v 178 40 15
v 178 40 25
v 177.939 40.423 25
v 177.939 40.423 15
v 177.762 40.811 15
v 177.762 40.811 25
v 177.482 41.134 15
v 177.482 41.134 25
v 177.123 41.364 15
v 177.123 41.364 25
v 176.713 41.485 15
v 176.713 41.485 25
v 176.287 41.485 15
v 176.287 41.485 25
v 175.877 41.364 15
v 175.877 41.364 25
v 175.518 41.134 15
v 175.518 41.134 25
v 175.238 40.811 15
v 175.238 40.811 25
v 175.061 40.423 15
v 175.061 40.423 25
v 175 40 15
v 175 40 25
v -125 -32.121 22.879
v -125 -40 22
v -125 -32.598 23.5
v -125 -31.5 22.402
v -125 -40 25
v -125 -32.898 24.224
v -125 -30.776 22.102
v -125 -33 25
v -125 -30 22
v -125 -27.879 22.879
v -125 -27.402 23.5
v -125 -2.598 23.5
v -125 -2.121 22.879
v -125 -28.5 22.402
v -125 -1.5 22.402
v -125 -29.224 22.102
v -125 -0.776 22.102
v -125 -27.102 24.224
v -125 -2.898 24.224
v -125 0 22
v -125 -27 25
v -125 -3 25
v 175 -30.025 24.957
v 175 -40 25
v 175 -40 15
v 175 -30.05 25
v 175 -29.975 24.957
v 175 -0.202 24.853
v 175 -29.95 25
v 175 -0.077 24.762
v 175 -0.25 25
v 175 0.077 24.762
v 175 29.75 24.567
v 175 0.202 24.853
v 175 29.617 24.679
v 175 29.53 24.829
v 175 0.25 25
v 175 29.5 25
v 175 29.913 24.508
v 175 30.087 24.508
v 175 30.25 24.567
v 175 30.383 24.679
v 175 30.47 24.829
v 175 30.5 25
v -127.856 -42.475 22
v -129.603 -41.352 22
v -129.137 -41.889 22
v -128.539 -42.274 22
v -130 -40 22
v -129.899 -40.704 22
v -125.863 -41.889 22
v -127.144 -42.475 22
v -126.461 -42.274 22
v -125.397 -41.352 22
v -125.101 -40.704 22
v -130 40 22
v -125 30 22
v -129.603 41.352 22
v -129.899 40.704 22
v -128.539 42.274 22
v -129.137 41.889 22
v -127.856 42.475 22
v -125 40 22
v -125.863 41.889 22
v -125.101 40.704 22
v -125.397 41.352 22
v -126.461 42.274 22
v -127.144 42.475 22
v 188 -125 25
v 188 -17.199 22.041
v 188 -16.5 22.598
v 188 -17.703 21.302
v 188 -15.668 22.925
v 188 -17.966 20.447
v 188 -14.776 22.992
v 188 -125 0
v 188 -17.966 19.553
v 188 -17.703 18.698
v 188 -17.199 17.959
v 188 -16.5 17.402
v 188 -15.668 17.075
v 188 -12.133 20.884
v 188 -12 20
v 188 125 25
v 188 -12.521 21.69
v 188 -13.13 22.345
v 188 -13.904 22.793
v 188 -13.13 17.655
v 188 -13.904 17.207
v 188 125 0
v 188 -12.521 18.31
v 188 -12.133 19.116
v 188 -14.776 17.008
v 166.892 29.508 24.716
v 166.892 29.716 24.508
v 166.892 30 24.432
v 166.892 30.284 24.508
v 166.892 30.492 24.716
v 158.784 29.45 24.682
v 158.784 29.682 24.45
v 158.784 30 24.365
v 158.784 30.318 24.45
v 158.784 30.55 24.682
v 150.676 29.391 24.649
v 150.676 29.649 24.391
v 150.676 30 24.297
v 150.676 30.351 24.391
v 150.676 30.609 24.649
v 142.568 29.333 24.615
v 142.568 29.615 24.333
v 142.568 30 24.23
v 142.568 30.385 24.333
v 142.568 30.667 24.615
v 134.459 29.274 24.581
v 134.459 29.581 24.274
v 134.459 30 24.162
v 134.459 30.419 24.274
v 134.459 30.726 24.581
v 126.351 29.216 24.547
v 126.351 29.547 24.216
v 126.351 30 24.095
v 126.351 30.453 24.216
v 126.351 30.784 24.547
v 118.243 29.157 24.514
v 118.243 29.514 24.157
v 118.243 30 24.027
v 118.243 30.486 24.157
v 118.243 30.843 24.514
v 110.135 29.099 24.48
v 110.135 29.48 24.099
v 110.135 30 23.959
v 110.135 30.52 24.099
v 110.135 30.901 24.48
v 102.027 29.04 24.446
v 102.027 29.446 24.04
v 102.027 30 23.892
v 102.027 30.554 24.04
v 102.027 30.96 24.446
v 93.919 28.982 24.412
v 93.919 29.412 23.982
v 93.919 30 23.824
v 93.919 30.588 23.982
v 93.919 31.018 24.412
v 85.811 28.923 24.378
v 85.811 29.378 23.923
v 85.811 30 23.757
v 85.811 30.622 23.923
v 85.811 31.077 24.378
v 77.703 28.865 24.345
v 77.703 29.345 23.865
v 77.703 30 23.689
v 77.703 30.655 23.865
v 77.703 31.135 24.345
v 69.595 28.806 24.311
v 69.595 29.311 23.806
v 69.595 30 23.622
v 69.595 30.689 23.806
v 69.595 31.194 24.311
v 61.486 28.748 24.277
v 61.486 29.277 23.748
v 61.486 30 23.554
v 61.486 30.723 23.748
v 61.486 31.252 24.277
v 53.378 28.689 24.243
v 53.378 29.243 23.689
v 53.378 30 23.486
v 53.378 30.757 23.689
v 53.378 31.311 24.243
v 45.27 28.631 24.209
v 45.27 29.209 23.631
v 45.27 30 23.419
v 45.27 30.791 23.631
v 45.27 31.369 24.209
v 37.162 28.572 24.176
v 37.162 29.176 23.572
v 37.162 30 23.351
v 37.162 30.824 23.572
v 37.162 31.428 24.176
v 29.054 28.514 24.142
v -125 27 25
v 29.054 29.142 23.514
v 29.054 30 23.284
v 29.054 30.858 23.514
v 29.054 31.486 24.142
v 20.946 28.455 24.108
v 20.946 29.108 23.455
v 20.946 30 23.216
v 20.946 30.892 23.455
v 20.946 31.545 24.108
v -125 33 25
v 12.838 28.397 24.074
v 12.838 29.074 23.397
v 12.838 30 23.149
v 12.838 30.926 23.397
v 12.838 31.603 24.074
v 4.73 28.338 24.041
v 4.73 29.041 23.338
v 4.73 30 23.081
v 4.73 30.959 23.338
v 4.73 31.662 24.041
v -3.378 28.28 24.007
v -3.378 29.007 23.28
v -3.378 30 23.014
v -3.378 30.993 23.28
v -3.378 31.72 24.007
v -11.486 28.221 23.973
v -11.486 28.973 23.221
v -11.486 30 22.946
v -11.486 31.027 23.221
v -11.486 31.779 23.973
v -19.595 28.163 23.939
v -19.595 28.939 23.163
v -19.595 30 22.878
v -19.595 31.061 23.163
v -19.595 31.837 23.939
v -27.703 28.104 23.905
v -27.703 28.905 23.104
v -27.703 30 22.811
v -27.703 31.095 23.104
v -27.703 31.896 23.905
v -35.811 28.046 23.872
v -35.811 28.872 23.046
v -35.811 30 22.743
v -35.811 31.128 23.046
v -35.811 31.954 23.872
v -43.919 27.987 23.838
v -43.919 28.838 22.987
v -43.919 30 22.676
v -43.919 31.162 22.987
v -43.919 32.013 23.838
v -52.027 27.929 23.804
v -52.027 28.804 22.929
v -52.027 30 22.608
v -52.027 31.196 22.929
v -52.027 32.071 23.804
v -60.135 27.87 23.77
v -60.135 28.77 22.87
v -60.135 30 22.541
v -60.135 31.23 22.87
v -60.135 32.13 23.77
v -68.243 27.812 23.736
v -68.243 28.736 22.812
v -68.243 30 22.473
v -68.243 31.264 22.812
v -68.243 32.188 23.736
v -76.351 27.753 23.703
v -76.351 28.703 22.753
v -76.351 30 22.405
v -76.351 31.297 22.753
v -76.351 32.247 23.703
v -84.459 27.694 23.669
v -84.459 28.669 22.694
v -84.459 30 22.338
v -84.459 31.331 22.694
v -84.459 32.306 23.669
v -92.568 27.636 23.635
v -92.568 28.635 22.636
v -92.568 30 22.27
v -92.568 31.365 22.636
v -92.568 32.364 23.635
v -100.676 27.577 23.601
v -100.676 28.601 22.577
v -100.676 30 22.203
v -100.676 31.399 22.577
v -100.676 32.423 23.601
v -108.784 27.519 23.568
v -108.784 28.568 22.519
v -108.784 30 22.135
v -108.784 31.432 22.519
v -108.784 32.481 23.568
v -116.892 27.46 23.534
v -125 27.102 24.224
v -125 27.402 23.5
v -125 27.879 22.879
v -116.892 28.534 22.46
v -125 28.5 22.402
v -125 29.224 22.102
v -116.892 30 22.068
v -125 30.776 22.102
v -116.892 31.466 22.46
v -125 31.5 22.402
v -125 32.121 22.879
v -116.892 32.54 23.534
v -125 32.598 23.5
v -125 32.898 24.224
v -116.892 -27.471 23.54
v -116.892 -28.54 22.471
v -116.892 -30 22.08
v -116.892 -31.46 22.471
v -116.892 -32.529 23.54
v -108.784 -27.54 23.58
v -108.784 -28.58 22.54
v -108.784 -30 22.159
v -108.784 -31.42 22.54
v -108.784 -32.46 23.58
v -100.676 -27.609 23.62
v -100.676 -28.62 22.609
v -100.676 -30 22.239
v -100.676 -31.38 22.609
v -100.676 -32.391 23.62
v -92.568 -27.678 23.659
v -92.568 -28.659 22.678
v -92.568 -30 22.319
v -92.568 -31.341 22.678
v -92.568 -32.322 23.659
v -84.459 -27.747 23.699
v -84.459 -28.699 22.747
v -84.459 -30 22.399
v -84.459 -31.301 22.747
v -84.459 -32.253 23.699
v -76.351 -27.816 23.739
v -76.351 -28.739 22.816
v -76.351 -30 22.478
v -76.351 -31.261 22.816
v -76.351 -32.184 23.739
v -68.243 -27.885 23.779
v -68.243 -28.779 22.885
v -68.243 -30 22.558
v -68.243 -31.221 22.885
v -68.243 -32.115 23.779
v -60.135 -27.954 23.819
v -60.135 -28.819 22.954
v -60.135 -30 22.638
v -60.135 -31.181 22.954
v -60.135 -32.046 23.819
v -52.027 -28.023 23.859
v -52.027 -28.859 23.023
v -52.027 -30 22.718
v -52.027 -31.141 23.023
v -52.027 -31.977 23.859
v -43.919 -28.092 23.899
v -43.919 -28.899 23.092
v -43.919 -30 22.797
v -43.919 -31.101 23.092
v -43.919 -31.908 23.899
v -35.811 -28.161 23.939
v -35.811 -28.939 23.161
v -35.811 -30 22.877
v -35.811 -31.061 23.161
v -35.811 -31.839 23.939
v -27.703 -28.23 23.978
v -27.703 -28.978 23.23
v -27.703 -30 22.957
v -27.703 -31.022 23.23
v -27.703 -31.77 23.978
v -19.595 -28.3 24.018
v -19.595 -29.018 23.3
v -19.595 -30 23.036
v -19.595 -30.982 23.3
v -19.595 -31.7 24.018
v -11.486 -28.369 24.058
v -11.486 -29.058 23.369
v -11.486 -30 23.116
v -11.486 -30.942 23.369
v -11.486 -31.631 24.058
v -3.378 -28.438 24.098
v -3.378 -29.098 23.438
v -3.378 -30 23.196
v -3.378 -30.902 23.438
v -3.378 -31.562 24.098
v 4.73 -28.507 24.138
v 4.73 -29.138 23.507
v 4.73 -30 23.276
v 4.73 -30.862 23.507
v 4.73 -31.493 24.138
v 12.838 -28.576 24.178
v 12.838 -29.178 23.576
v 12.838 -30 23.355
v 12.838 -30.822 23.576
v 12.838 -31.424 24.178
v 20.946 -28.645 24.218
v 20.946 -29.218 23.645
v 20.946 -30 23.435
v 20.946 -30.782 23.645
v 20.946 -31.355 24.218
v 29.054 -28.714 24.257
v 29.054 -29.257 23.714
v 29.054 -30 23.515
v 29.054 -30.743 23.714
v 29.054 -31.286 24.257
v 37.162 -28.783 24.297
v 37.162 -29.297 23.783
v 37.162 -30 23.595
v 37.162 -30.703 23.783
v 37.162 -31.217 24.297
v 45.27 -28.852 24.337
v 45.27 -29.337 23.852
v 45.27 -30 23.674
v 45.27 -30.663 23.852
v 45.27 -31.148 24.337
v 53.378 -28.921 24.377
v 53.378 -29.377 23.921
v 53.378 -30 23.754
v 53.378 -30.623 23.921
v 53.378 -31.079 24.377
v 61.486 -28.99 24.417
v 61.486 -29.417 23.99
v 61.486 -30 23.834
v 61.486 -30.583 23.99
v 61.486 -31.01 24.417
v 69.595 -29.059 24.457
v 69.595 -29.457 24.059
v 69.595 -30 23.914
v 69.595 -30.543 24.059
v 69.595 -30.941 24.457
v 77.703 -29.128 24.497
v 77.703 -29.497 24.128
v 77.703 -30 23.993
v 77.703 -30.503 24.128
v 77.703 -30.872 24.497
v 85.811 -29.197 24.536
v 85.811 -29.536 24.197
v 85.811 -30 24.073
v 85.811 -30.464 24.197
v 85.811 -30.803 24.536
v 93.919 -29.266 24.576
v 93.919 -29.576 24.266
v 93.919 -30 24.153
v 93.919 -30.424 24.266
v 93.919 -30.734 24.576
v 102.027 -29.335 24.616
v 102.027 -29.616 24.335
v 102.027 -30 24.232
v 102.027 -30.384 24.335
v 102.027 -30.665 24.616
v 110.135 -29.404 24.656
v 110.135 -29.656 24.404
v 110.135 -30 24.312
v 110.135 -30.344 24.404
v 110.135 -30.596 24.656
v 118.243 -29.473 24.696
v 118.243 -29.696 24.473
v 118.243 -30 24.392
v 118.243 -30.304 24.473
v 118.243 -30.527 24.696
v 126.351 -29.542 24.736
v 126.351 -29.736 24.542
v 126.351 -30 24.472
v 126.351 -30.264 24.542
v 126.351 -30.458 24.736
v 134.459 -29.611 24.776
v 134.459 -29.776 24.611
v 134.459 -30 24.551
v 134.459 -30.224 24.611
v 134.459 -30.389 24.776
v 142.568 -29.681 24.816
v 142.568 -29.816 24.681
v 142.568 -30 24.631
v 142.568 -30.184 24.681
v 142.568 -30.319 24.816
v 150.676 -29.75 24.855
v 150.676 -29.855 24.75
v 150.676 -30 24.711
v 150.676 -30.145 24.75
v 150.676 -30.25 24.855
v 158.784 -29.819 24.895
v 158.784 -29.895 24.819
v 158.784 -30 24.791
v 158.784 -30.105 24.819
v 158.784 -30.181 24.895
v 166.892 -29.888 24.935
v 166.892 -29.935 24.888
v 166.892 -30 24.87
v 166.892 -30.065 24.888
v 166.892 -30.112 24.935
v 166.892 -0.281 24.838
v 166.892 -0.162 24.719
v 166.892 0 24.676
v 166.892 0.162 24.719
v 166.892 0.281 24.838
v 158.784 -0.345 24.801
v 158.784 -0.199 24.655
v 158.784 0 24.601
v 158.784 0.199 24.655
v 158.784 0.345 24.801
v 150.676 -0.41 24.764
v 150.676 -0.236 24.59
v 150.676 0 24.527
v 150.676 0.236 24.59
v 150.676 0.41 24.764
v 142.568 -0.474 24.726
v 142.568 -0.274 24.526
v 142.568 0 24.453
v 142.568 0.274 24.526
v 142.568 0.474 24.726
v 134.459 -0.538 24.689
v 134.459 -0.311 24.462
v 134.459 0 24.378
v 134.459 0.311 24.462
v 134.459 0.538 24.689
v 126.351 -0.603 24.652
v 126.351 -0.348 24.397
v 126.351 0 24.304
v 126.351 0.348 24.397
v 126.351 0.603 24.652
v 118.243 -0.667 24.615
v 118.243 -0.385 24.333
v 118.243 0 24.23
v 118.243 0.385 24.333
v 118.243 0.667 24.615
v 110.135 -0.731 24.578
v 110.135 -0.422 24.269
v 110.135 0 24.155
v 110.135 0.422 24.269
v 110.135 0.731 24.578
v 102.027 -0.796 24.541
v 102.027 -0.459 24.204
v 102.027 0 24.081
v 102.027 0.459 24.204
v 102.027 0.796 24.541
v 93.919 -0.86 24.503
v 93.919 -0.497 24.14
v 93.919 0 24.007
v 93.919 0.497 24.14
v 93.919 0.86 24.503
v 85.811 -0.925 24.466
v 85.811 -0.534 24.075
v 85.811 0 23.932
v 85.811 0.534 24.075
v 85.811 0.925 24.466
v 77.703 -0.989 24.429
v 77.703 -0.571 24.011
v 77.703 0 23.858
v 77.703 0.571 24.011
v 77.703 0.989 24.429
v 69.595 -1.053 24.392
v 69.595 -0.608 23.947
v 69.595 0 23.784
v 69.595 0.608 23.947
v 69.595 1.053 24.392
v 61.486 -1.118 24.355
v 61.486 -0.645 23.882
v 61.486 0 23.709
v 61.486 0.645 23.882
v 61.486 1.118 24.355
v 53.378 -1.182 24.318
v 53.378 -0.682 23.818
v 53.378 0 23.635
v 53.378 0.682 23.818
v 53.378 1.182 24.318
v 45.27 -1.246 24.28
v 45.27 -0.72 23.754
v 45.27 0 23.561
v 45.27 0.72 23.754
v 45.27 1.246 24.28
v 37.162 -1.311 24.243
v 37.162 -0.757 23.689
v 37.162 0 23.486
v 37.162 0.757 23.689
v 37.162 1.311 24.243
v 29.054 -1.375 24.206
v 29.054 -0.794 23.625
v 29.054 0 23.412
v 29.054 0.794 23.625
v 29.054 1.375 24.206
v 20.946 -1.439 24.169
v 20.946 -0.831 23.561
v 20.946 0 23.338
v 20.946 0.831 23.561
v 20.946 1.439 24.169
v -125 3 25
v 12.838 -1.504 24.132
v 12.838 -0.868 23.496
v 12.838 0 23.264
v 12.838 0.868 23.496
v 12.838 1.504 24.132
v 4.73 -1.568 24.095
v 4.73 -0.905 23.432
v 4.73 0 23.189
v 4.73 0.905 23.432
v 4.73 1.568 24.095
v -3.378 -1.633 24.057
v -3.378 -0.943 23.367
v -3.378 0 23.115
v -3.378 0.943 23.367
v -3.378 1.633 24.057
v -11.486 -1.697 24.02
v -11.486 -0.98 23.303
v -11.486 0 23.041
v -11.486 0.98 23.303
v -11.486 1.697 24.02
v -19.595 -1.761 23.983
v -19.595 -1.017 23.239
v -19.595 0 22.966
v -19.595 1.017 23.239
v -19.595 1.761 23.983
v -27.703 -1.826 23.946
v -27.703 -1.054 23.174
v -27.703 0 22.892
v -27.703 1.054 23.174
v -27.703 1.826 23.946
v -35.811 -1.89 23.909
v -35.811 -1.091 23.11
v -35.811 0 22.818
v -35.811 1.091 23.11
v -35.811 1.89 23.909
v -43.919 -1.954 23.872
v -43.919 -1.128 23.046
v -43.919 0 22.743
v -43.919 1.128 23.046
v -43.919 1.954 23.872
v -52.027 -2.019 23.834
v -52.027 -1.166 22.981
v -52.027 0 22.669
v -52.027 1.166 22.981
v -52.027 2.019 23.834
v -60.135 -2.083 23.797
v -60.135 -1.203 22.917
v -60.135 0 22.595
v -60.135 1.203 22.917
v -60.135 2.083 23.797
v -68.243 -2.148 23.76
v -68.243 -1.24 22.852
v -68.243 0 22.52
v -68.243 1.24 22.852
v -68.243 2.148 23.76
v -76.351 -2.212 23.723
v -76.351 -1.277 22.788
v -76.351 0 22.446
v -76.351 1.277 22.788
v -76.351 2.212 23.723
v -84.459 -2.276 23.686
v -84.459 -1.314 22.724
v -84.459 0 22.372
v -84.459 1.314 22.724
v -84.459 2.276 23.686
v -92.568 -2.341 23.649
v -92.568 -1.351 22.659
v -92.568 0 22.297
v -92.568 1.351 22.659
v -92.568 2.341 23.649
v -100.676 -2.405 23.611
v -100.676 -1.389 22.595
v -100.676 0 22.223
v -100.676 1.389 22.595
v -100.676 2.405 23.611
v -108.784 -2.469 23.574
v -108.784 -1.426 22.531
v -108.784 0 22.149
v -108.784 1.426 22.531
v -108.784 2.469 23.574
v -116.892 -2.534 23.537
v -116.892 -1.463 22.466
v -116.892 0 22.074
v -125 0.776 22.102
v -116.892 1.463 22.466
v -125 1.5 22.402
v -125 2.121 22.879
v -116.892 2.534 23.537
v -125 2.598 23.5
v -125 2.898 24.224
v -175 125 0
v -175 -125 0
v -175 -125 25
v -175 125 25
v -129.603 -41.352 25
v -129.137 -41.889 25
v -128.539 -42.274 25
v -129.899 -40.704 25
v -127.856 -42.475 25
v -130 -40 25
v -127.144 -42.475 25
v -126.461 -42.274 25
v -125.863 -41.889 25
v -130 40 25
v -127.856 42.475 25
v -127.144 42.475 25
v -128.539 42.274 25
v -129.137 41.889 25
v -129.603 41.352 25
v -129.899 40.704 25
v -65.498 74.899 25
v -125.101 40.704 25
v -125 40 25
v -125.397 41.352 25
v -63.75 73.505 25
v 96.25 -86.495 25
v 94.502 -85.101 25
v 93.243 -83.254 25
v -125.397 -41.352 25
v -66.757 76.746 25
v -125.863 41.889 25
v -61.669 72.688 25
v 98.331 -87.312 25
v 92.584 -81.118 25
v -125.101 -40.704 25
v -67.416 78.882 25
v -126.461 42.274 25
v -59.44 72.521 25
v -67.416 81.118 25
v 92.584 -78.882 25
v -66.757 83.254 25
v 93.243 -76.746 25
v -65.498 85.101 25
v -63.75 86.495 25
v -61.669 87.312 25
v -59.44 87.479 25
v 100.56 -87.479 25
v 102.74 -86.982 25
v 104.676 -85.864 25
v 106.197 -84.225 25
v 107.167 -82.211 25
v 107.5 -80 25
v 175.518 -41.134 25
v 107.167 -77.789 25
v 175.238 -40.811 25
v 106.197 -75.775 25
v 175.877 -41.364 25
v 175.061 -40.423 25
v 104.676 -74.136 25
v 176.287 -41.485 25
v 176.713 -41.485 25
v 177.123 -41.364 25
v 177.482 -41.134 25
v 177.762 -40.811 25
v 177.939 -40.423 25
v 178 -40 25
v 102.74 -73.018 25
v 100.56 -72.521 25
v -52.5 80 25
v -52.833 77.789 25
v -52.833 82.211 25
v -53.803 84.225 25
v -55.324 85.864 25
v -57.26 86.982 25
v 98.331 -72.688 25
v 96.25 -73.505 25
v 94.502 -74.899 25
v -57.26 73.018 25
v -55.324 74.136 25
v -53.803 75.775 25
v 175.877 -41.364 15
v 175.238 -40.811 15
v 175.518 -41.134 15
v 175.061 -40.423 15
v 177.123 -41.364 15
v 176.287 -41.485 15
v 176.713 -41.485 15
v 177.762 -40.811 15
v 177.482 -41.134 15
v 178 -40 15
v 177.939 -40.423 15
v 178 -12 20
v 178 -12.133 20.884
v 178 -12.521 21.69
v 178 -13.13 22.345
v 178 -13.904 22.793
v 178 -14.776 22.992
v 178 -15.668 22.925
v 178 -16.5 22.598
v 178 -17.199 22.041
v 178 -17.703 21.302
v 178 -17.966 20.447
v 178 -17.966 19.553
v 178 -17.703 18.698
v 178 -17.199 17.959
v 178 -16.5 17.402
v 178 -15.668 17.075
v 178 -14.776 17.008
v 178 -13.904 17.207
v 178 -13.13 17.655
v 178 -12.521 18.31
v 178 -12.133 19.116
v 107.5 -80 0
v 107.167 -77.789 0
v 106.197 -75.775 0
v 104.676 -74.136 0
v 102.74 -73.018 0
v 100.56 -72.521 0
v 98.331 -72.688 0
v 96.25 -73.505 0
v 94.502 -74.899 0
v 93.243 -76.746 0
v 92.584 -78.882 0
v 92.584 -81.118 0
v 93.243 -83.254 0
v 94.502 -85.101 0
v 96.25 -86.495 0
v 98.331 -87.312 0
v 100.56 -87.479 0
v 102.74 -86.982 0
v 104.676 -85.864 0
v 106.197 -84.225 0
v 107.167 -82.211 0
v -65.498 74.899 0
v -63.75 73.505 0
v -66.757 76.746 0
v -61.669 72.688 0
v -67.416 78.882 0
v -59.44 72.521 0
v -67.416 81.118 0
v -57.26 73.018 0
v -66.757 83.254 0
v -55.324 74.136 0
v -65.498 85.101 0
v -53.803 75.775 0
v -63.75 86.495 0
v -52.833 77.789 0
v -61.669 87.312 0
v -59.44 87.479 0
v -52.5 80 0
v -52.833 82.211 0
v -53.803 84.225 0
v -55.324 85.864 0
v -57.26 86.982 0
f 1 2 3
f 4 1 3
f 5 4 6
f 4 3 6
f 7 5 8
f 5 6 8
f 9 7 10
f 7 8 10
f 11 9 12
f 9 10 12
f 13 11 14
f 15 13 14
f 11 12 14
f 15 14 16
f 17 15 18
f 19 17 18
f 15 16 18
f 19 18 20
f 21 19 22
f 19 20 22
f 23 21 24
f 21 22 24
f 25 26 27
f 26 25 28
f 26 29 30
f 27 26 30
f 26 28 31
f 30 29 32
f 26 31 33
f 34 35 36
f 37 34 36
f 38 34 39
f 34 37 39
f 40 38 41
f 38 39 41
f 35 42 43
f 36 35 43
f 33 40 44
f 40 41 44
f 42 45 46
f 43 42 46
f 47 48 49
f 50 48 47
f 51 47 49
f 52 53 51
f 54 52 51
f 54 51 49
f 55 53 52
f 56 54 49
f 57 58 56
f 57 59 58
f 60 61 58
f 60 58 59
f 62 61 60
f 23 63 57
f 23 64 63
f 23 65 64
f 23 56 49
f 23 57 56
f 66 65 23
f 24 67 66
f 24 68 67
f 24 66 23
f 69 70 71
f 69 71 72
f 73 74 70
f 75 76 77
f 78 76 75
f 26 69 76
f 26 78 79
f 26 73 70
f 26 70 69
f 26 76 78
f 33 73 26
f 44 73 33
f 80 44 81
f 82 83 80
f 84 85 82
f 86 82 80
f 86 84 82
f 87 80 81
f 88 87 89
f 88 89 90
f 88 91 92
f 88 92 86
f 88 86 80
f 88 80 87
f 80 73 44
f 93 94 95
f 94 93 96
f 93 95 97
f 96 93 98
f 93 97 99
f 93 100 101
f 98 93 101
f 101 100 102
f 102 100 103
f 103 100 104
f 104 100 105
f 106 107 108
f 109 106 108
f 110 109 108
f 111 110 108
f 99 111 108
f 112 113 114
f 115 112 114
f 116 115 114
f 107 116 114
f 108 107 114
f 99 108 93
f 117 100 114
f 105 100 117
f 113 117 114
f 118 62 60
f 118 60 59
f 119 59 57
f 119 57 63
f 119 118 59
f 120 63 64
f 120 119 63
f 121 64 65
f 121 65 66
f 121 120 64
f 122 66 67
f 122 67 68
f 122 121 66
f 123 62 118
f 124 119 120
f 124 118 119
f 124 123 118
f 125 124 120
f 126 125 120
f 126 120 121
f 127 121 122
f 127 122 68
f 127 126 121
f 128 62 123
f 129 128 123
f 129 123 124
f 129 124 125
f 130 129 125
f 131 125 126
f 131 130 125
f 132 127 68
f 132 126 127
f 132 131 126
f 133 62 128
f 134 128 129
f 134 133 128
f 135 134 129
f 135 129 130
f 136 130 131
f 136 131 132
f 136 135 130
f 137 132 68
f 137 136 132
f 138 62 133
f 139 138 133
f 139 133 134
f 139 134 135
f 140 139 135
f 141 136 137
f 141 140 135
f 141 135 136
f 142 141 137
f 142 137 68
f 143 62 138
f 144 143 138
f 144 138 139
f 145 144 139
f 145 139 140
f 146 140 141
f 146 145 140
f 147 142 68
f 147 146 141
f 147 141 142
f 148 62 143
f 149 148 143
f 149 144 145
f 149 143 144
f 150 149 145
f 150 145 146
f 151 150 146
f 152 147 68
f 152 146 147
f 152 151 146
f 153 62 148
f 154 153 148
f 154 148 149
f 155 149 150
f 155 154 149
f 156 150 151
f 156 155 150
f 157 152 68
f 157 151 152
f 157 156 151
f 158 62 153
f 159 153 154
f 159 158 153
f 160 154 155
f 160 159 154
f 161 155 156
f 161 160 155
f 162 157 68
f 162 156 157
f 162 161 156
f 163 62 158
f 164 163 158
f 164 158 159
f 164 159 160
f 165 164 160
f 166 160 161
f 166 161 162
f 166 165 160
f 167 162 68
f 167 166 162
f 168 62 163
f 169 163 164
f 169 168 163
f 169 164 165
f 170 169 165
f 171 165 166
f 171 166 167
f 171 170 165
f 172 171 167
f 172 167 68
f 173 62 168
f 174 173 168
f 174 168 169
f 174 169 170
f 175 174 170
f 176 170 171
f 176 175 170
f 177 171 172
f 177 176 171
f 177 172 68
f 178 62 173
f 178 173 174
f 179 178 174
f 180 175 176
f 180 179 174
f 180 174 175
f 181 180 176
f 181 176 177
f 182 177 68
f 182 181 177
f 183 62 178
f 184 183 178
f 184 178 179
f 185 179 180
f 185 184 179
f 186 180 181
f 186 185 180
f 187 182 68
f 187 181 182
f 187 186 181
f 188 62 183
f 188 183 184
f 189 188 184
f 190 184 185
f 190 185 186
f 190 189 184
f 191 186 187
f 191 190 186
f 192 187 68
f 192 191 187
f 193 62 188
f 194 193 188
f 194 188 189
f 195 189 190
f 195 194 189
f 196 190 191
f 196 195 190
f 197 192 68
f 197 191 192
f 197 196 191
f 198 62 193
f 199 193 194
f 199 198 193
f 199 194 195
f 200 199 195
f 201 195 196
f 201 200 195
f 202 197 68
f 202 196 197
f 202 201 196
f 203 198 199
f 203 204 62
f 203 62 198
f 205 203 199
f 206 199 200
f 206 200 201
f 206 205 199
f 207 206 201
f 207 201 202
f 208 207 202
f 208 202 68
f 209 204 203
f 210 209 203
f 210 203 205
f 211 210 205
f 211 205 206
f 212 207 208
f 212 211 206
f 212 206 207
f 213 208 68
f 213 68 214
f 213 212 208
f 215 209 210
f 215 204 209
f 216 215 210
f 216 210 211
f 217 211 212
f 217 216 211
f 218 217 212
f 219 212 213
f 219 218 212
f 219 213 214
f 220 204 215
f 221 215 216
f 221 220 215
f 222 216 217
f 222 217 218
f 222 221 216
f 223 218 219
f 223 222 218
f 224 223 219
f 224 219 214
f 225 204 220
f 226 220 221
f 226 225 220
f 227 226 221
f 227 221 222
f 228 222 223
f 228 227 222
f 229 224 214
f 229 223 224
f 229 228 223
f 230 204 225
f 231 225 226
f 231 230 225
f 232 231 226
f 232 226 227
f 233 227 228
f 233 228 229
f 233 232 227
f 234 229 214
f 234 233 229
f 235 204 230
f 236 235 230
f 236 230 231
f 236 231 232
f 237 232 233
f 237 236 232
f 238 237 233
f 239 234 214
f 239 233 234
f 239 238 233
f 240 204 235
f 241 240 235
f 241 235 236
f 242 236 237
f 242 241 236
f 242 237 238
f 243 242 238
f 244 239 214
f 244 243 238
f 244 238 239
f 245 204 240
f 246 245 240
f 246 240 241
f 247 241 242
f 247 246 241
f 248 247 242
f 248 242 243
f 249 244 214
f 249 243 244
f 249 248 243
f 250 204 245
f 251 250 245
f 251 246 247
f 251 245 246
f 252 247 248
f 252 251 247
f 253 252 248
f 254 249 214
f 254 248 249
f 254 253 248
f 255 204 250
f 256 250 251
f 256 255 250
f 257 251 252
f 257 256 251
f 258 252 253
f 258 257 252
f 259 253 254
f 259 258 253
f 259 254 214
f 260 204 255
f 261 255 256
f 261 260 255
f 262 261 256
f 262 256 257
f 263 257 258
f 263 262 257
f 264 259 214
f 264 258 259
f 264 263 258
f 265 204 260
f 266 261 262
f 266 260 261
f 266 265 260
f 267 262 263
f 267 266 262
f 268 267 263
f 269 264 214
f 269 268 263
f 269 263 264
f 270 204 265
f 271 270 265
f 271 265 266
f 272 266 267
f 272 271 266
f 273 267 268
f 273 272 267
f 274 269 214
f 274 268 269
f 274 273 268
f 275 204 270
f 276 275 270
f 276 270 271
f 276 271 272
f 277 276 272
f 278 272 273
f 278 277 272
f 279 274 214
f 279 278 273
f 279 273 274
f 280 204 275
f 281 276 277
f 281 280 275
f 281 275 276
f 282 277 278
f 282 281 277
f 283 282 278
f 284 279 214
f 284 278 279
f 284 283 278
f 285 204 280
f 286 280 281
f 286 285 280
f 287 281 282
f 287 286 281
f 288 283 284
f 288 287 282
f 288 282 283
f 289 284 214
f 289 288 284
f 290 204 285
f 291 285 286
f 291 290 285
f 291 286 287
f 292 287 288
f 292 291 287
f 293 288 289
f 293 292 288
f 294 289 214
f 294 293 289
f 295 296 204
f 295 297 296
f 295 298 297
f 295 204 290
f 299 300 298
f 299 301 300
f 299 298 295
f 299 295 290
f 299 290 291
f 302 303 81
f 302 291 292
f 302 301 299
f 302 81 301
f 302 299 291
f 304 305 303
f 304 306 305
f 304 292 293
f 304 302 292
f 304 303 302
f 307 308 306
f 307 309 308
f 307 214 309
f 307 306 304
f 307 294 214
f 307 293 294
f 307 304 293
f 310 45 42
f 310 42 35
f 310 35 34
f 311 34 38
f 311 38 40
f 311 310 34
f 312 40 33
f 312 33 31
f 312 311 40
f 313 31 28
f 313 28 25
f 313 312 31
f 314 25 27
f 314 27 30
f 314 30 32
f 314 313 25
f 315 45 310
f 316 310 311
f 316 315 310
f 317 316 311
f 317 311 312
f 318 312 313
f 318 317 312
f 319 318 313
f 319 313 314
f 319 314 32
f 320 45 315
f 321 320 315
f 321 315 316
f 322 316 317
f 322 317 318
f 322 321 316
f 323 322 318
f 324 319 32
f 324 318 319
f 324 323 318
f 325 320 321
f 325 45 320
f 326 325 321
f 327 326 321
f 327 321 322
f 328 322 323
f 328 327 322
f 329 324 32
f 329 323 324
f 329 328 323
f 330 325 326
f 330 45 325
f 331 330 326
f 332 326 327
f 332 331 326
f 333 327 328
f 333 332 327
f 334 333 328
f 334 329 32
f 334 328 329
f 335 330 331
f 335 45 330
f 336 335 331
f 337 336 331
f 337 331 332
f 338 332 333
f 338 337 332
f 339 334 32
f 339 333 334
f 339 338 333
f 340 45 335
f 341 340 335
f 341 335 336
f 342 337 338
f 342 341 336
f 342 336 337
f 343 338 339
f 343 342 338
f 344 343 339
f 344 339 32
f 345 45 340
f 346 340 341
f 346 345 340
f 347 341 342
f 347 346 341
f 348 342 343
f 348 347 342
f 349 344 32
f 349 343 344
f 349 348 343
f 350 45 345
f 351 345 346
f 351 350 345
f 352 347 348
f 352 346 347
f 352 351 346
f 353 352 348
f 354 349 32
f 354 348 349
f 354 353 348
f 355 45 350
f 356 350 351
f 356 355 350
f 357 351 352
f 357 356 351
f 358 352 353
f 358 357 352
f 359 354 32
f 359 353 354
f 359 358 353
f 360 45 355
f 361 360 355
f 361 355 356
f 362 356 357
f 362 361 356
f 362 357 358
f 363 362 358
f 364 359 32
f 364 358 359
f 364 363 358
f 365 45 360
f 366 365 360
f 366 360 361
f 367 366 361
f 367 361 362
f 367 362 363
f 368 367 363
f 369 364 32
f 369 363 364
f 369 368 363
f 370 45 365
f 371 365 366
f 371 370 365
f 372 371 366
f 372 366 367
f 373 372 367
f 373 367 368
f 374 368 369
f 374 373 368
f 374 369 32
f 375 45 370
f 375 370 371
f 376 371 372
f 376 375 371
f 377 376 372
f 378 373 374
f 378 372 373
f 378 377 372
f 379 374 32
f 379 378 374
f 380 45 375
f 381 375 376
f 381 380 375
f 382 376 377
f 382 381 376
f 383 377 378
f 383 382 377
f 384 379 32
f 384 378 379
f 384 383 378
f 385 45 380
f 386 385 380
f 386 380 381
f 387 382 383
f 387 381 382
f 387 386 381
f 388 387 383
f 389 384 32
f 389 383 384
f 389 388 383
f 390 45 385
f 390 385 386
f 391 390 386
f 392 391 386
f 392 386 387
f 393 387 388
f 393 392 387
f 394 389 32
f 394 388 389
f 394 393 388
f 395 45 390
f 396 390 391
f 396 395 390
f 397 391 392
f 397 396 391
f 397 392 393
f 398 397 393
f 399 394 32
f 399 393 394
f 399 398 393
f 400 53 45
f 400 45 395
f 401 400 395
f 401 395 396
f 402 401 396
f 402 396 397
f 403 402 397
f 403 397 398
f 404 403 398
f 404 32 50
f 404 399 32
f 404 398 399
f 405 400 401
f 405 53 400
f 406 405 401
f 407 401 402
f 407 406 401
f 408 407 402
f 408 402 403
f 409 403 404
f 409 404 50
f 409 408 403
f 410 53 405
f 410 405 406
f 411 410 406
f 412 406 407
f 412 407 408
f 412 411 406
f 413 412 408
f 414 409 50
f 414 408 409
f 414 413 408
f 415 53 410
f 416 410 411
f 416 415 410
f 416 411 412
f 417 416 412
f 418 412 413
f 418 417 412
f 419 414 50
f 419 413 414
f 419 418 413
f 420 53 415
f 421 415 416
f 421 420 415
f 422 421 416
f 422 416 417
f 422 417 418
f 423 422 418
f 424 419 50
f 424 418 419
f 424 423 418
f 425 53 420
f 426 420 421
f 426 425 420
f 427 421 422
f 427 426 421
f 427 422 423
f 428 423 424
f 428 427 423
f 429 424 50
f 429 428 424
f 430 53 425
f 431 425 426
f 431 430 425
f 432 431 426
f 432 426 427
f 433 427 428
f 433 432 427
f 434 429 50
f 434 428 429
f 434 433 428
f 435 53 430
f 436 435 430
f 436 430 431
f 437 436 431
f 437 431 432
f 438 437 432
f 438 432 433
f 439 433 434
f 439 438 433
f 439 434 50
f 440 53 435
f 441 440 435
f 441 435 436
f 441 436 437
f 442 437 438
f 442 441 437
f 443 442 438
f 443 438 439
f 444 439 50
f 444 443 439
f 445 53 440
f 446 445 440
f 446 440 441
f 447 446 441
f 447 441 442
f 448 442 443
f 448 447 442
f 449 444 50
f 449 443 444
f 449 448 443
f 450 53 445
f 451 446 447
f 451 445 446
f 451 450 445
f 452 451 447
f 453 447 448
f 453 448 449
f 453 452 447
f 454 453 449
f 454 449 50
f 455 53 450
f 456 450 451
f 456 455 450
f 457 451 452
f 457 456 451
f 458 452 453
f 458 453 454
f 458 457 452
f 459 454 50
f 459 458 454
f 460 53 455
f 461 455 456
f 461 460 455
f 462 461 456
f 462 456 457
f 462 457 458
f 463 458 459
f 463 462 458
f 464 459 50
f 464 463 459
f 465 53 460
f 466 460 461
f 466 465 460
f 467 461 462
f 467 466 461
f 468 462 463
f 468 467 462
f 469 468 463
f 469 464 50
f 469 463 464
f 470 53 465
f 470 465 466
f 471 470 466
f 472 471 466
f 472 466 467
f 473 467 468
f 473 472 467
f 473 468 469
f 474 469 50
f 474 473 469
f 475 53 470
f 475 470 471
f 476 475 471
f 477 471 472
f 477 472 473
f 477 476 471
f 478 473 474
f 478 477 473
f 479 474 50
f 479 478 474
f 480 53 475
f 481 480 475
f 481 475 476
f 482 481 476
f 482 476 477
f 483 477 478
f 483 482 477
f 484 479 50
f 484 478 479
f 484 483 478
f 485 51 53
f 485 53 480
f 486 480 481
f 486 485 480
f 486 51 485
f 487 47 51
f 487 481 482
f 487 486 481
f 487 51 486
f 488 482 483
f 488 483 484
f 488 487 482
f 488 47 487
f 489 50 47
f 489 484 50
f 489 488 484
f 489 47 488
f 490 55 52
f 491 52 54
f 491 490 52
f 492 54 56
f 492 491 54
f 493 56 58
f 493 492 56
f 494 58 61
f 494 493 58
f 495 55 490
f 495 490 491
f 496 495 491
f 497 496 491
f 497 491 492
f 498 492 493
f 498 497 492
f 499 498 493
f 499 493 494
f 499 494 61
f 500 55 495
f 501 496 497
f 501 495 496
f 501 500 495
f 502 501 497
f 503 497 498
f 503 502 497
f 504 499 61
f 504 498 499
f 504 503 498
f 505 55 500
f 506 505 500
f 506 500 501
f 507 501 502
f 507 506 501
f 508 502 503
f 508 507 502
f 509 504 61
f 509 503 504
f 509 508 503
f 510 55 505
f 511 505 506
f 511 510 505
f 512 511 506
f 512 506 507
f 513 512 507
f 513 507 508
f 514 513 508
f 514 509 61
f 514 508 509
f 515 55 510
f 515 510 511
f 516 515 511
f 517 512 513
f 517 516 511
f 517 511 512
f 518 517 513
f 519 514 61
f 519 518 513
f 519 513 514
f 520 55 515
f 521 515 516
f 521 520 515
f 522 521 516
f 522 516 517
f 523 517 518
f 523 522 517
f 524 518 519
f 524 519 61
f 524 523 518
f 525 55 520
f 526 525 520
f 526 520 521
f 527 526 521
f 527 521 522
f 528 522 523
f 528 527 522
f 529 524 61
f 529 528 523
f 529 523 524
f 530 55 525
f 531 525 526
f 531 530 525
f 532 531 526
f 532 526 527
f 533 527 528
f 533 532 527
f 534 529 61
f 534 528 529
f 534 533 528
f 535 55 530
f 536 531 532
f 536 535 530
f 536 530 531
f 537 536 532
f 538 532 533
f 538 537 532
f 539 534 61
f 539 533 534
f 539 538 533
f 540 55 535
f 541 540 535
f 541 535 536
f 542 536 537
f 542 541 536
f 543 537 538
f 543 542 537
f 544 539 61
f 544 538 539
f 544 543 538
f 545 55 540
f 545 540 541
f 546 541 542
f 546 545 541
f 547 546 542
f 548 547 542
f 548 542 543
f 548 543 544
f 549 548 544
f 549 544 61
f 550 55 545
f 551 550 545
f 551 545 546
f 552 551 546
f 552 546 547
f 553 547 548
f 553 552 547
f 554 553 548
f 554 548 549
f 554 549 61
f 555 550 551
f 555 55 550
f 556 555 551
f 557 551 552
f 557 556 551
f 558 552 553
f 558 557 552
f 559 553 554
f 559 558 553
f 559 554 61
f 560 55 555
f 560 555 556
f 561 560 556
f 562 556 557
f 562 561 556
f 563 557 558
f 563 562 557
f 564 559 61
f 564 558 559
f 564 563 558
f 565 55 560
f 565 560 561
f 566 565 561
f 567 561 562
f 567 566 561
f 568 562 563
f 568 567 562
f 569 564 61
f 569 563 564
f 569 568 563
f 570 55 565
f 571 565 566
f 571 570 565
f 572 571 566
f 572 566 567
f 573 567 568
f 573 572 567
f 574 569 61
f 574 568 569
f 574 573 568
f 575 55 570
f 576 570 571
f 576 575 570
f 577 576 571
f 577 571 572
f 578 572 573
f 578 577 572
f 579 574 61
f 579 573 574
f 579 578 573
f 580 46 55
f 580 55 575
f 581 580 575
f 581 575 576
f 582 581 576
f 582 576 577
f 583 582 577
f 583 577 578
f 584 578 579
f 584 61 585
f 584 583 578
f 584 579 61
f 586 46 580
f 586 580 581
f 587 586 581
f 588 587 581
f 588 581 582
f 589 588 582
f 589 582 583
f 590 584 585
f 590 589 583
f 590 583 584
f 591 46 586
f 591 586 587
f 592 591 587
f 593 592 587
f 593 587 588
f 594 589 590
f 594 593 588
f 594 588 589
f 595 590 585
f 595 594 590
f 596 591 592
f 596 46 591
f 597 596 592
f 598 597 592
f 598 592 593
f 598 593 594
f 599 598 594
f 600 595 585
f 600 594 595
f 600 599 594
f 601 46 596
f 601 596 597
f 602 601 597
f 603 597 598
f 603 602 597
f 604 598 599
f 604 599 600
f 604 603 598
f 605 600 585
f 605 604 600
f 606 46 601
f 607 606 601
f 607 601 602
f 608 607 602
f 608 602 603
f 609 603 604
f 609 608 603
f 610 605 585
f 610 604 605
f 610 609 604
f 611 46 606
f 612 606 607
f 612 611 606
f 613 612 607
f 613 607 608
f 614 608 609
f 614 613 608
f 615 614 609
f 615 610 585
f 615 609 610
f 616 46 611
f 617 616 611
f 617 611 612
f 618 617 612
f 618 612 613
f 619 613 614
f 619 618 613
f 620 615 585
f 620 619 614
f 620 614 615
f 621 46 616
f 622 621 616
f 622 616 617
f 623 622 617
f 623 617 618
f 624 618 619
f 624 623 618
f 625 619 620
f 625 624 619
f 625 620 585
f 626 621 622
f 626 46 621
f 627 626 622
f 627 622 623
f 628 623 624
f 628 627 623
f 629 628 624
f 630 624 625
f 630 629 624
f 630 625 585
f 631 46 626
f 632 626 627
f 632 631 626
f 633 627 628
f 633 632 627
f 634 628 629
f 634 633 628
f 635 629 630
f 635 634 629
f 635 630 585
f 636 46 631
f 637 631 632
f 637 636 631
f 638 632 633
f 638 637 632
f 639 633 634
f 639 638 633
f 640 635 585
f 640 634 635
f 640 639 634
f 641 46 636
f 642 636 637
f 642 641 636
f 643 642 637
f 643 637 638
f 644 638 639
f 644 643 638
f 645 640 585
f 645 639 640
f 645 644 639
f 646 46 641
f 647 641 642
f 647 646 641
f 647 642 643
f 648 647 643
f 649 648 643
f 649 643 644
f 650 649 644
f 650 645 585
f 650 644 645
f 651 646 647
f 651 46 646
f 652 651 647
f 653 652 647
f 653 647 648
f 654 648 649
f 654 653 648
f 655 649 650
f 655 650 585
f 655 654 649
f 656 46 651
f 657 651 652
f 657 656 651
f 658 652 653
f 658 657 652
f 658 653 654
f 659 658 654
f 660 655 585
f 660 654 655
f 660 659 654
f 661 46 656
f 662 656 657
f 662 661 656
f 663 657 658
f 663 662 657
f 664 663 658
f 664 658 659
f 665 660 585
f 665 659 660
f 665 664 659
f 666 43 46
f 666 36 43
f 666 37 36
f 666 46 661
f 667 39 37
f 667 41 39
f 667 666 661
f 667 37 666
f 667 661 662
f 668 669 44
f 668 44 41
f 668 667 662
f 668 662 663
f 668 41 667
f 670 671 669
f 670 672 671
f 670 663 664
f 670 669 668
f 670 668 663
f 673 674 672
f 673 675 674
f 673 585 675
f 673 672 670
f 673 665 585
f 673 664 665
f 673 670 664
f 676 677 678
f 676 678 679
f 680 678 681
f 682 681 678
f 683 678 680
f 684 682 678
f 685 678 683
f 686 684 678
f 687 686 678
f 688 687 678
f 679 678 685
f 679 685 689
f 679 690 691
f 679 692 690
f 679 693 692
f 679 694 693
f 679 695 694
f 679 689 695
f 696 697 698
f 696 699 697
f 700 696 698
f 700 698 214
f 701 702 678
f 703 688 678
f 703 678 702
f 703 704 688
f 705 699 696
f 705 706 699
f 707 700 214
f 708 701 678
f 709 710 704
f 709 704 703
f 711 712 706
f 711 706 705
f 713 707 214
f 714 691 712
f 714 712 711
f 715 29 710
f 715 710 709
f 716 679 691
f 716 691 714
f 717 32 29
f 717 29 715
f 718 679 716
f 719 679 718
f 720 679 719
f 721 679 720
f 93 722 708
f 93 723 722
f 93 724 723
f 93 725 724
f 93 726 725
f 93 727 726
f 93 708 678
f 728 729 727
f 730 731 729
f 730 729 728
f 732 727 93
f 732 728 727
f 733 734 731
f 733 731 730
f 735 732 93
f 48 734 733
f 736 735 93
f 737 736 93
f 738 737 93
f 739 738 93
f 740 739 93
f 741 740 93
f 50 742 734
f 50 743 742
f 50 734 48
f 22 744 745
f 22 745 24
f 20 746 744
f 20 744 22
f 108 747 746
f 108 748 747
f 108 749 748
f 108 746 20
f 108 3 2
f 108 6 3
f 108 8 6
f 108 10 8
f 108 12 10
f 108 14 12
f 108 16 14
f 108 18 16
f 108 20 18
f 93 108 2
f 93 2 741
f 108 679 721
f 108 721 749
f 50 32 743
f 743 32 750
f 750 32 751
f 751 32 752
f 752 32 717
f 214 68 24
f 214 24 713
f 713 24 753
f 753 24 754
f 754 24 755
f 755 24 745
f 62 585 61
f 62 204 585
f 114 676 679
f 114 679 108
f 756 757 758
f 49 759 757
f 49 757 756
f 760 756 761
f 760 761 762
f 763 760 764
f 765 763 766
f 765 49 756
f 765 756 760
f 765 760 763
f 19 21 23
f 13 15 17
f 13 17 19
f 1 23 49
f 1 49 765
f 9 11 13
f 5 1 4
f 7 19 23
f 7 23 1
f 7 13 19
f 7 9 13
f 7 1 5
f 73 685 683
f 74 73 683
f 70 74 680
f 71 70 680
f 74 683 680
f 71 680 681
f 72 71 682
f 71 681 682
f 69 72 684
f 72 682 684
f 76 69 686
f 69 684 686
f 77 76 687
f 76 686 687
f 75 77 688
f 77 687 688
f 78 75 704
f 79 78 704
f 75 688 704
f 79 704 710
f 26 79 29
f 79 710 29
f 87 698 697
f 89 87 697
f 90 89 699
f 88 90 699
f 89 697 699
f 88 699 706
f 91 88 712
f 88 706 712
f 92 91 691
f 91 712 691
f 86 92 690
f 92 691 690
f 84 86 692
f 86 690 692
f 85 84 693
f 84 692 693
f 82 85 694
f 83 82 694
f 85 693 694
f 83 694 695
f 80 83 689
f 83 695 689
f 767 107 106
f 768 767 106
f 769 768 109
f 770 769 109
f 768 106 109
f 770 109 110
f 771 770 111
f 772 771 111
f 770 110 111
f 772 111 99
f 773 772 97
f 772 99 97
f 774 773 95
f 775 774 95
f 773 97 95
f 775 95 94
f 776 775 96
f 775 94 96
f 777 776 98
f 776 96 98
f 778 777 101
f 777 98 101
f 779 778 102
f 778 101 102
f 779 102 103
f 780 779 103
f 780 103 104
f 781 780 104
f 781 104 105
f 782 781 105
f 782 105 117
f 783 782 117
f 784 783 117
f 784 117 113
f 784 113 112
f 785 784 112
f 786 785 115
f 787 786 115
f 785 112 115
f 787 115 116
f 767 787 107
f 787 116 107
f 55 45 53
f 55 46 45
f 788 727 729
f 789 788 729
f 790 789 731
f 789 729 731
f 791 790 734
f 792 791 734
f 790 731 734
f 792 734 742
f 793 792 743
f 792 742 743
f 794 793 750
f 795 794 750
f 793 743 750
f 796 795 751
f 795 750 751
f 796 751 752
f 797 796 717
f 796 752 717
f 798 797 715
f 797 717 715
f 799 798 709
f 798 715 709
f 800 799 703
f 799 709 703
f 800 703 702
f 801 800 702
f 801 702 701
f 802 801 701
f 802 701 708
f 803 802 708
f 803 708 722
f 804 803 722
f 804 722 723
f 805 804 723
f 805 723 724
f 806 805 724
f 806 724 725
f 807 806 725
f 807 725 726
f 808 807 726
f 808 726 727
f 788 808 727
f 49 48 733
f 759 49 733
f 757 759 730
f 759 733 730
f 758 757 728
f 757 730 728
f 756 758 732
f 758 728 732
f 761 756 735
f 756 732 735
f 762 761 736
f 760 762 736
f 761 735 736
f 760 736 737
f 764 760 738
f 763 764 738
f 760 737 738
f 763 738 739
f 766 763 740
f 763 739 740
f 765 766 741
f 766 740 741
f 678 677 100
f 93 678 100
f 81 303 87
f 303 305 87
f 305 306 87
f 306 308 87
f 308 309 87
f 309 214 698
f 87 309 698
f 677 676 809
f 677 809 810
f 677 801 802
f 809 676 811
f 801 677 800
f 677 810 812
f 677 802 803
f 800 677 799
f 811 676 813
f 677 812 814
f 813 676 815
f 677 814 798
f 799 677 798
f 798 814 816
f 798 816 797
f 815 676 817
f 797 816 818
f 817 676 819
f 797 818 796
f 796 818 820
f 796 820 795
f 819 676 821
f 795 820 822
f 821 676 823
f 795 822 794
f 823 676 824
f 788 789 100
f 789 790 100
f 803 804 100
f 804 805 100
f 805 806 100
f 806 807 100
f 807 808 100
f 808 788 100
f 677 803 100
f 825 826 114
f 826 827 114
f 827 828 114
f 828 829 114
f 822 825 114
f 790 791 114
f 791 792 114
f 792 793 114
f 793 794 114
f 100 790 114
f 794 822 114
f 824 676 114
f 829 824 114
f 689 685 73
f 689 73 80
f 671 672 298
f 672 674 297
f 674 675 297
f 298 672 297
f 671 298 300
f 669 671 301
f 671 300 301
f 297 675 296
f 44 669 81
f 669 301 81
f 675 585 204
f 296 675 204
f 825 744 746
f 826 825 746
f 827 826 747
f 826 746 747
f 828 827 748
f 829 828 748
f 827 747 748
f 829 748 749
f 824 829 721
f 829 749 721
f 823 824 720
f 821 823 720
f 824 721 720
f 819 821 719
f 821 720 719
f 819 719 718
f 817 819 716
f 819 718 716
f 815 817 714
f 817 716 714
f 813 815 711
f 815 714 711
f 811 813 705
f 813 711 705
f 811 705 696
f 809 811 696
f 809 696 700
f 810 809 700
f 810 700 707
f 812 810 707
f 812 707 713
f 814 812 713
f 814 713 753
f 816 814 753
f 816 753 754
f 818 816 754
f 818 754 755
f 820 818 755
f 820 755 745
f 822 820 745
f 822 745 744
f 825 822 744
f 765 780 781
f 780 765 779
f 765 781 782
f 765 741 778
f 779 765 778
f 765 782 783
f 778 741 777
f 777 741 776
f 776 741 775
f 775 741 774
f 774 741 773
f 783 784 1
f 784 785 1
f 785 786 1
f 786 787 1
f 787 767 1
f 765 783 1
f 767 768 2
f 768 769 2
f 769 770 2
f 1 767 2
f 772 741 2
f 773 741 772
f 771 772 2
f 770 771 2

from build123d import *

# Parameters (mm, degrees)
F0_W      = 350
F0_H      = 250
F1_DEPTH  = 25
F4_R      = 7.5
F4_R_2    = 5
F5_DEPTH  = 25.001
F10_W     = 5
F10_H     = 80
F11_DEPTH = 3
F12_W     = 13
F12_H     = 250
F13_DEPTH = 25
F14_W     = 3
F14_H     = 80
F15_DEPTH = 10
F16_R     = 3
F17_DEPTH = 10


with BuildPart() as f1:
    # F0 (on Top) → F1 (new body)
    with BuildSketch(Plane.XY):
        Rectangle(F0_W, F0_H)
    extrude(amount=F1_DEPTH)

    # F2 (on face) → F3 (revolve, cut)
    with BuildSketch(Plane.XY.offset(25)):
        Polygon((175, 0), (175, 0.25), (-125, 3), (-125, 0), align=None)
    revolve(axis=Axis((25, 0, 25), (1, 0, 0)), mode=Mode.SUBTRACT)

    # F4 (on face) → F5 (cut, through all)
    with BuildSketch(Plane.XY.offset(25)):
        with Locations((-60, 80)):
            Circle(F4_R)
        with Locations((-60, 80)):
            Circle(F4_R_2, mode=Mode.SUBTRACT)
        with Locations((-60, 80)):
            Circle(F4_R_2)
        with Locations((100, -80)):
            Circle(F4_R)
        with Locations((100, -80)):
            Circle(F4_R_2, mode=Mode.SUBTRACT)
        with Locations((100, -80)):
            Circle(F4_R_2)
    extrude(amount=-F5_DEPTH, mode=Mode.SUBTRACT)

    # F6 (on face) → F7 (revolve, cut)
    with BuildSketch(Plane.XY.offset(25)):
        Polygon((-125, 33), (-125, 30), (175, 30), (175, 30.5), align=None)
    revolve(axis=Axis((25, 30, 25), (1, 0, 0)), mode=Mode.SUBTRACT)

    # F8 (on face) → F9 (revolve, cut)
    with BuildSketch(Plane.XY.offset(25)):
        Polygon((175, -30), (-125, -30), (-125, -33), (175, -30.05), align=None)
    revolve(axis=Axis((25, -30, 25), (-1, 0, 0)), mode=Mode.SUBTRACT)

    # F10 (on face) → F11 (cut)
    with BuildSketch(Plane.XY.offset(25)):
        with Locations((-127.5, 0)):
            Rectangle(F10_W, F10_H)
        with BuildLine():
            Line((-130, 40), (-125, 40))
            ThreePointArc((-125, 40), (-127.5, 42.5), (-130, 40))
        make_face()
        with BuildLine():
            ThreePointArc((-130, -40), (-127.5, -42.5), (-125, -40))
            Line((-125, -40), (-130, -40))
        make_face()
    extrude(amount=-F11_DEPTH, mode=Mode.SUBTRACT)

    # F12 (on Top) → F13 (join)
    with BuildSketch(Plane.XY):
        with Locations((181.5, 0)):
            Rectangle(F12_W, F12_H)
    extrude(amount=F13_DEPTH)

    # F14 (on face) → F15 (cut)
    with BuildSketch(Plane.XY.offset(25)):
        with BuildLine():
            ThreePointArc((178, 40), (176.5, 41.5), (175, 40))
            Line((175, 40), (178, 40))
        make_face()
        with Locations((176.5, 0)):
            Rectangle(F14_W, F14_H)
        with BuildLine():
            Line((178, -40), (175, -40))
            ThreePointArc((175, -40), (176.5, -41.5), (178, -40))
        make_face()
    extrude(amount=-F15_DEPTH, mode=Mode.SUBTRACT)

    # F16 (on face) → F17 (cut, through all)
    with BuildSketch(Plane.YZ.offset(188)):
        with Locations((-15, 20)):
            Circle(F16_R)
    extrude(amount=-F17_DEPTH, mode=Mode.SUBTRACT)


solid = f1.part
